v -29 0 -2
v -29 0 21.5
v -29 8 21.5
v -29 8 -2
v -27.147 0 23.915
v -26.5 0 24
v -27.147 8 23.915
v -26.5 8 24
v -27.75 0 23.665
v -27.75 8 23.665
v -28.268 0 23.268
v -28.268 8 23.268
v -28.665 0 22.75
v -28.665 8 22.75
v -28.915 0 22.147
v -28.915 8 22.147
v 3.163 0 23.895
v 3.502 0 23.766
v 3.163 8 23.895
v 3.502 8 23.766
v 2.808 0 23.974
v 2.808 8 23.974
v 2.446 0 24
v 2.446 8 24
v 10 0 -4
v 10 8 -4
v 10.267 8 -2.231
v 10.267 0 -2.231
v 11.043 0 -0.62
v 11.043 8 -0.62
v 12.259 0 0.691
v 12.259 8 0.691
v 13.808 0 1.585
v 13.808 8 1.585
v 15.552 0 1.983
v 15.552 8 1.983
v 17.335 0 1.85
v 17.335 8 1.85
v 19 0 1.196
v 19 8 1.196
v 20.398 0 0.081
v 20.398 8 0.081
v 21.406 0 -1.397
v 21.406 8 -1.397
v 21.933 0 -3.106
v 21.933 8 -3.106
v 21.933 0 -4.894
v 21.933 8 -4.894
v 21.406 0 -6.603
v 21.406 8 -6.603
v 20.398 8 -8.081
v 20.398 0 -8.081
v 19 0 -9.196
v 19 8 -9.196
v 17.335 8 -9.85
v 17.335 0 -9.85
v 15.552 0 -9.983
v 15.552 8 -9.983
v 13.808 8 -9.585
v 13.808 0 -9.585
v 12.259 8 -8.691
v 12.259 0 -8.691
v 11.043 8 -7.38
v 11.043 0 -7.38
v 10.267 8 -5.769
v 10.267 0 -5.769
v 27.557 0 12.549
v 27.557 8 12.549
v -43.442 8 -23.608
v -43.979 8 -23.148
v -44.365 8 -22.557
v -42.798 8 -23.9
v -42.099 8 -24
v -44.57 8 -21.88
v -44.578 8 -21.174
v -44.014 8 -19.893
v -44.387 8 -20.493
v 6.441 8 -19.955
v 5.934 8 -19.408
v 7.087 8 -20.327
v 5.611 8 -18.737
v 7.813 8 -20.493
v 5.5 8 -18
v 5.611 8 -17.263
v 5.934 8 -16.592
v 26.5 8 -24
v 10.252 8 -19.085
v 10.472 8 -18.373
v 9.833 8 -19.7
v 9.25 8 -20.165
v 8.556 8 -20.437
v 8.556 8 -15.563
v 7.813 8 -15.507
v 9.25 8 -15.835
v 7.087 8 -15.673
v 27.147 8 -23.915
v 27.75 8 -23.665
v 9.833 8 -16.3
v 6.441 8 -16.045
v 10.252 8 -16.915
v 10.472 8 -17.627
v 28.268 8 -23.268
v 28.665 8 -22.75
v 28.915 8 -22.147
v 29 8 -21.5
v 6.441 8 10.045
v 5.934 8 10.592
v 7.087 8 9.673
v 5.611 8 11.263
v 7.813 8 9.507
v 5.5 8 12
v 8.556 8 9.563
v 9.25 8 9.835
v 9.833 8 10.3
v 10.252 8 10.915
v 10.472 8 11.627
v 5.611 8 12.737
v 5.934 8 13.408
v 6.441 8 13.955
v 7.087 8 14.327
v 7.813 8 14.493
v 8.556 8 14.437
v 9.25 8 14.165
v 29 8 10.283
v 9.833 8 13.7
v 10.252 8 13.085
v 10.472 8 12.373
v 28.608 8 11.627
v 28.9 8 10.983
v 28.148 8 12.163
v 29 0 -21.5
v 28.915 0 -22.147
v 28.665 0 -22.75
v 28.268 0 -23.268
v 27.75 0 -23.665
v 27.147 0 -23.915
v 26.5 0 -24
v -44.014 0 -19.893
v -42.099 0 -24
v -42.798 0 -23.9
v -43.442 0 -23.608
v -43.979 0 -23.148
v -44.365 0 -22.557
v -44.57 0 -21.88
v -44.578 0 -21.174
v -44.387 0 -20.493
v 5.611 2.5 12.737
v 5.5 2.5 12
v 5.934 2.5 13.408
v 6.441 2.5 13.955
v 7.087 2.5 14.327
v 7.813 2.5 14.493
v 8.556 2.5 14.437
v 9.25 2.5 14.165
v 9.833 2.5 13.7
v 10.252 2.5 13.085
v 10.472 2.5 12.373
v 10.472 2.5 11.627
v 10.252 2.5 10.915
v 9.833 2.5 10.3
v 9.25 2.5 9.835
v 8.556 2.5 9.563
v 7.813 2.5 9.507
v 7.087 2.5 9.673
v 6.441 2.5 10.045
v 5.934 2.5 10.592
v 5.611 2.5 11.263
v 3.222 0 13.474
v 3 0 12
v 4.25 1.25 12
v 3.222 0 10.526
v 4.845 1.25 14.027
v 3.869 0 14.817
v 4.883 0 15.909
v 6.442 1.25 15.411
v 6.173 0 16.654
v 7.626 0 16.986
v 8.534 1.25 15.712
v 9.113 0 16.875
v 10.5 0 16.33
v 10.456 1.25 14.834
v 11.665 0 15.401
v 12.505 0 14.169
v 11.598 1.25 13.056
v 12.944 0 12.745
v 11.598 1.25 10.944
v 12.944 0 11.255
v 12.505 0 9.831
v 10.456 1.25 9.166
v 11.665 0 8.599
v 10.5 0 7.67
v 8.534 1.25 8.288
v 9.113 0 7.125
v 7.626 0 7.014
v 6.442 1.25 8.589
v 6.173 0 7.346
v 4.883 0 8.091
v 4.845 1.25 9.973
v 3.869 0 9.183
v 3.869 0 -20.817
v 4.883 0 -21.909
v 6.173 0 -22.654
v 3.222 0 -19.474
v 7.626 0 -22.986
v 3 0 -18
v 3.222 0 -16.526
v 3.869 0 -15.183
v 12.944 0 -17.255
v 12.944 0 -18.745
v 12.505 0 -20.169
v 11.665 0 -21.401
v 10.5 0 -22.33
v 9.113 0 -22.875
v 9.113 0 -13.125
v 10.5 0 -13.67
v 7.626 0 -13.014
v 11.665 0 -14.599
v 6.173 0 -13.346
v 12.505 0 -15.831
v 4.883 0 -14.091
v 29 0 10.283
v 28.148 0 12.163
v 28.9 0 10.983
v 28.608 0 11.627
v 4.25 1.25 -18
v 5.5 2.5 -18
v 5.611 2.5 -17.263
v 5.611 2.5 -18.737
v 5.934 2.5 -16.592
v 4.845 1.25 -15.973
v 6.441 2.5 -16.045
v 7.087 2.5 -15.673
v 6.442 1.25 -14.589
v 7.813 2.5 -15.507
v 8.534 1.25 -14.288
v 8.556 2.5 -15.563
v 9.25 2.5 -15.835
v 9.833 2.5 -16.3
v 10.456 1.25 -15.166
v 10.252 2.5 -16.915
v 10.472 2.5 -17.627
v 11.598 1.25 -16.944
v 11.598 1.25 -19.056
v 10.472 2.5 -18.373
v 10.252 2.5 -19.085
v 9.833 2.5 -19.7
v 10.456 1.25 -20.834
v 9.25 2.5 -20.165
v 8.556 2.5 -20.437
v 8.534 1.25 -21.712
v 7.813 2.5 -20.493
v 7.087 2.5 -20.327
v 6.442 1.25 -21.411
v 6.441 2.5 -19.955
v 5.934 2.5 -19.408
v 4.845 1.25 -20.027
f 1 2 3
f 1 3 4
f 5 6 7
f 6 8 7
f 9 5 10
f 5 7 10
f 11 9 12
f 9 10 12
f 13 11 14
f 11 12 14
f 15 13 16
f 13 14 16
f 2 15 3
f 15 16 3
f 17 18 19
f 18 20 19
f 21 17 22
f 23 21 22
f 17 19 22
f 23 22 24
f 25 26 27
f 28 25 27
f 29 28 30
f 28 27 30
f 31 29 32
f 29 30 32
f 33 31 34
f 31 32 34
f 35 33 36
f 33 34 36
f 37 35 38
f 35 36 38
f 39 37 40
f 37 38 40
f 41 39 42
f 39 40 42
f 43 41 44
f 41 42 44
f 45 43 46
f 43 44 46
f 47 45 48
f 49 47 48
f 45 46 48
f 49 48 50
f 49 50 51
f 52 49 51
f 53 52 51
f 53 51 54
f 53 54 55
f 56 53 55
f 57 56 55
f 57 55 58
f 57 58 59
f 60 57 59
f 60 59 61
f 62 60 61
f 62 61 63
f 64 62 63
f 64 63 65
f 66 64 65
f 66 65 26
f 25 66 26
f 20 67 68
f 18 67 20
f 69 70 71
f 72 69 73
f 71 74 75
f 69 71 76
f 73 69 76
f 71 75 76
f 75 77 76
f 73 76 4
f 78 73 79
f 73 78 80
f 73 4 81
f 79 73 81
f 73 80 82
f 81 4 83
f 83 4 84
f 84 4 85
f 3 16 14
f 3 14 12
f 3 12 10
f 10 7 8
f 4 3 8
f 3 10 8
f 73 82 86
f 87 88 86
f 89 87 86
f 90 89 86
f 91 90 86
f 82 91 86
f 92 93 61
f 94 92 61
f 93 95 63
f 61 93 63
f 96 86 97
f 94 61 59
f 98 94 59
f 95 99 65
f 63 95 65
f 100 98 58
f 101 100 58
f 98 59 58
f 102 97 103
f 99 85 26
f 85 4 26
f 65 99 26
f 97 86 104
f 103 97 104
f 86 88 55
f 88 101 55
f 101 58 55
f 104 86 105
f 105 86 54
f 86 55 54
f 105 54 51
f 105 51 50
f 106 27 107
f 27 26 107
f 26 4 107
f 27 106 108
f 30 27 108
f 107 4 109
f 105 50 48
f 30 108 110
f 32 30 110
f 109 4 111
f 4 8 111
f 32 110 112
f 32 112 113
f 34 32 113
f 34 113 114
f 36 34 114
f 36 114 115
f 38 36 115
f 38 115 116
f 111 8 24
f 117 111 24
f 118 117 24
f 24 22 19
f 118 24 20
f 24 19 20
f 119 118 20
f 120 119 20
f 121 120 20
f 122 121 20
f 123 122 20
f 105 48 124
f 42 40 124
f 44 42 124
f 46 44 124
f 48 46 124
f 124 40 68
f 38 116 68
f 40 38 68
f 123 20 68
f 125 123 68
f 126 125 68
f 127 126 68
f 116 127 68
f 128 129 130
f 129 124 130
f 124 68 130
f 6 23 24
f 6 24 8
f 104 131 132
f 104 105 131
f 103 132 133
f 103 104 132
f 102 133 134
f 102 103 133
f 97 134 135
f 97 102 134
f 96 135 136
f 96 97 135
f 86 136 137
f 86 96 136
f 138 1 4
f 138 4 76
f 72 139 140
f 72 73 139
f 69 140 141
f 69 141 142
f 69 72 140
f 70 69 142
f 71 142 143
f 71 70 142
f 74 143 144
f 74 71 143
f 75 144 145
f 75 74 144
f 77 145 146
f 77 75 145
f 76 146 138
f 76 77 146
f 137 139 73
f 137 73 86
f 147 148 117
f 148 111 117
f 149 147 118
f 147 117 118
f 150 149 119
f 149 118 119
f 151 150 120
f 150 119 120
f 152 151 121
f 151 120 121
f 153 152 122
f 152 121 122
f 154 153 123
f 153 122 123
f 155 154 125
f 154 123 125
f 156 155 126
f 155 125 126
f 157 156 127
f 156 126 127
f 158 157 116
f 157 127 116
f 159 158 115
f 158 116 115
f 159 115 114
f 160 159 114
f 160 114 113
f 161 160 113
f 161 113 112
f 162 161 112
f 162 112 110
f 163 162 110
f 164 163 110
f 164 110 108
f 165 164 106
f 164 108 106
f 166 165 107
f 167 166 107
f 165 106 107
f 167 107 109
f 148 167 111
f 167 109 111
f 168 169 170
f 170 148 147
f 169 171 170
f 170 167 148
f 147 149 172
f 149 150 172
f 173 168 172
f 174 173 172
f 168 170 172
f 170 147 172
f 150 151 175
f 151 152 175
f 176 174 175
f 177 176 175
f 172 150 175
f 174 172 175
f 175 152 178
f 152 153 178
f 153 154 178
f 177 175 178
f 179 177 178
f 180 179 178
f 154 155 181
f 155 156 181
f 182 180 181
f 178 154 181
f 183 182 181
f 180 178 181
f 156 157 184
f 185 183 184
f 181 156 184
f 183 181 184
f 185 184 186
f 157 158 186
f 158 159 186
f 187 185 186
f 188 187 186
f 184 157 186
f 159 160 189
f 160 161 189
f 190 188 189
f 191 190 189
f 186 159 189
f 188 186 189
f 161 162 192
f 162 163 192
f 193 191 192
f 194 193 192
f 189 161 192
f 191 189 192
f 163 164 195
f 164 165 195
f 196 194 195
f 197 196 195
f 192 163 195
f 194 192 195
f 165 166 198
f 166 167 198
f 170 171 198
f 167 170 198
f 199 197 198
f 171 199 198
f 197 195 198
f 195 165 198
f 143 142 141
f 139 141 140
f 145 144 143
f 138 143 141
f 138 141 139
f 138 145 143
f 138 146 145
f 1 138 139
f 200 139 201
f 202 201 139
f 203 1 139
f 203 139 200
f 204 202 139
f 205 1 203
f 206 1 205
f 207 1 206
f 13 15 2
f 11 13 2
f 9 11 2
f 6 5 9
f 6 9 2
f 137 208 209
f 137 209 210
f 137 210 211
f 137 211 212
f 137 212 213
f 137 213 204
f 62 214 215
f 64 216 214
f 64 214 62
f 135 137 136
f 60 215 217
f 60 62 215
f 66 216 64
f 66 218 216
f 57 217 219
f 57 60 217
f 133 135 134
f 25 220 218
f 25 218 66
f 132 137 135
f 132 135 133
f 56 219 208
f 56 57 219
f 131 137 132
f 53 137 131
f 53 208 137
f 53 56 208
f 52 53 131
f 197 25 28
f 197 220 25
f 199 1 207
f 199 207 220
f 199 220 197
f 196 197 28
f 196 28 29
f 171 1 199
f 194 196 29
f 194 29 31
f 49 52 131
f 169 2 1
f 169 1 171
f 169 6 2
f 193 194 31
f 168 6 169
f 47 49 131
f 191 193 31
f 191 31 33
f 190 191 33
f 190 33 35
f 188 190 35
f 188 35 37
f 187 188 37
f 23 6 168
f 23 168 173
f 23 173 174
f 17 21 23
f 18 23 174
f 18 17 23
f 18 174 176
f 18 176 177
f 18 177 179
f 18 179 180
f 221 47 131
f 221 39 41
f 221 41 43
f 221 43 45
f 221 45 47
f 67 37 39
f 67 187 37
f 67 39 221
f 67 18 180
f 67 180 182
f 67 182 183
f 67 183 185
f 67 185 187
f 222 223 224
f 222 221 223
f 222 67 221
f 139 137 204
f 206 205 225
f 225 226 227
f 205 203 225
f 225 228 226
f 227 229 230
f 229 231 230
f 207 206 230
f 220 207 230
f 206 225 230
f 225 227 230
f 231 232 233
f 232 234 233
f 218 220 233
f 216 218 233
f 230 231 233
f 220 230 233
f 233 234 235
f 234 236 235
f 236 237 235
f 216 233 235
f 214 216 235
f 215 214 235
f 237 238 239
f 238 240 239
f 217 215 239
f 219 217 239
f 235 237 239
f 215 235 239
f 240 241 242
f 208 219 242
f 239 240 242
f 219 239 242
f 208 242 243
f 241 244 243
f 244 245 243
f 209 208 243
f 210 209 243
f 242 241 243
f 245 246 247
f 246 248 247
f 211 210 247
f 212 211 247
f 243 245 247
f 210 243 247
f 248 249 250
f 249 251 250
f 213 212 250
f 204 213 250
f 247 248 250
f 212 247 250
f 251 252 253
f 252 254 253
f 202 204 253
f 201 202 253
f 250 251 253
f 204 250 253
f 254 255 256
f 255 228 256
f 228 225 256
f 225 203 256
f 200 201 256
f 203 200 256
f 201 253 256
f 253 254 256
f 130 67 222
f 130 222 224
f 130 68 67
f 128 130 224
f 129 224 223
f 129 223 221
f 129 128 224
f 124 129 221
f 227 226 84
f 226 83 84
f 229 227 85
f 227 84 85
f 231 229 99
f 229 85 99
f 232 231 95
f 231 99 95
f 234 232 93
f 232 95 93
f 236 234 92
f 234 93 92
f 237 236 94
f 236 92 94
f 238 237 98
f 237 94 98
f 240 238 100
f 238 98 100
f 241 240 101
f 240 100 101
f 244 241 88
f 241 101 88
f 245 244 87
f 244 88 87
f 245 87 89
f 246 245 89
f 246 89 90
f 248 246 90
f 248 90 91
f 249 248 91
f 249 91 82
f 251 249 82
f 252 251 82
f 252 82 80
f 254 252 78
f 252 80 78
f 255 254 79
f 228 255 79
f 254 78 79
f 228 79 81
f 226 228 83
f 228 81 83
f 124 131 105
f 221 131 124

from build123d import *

# Parameters (mm, degrees)
F1_DEPTH       = 8
F2_D           = 5
F2_CSINK_D     = 10
F2_CSINK_ANGLE = 90
F3_D           = 12
F4_R           = 2.5


with BuildPart() as f1:
    # F0 (on Front) → F1 (new body)
    with BuildSketch(Plane.XZ):
        Polygon((29, 11.876001), (3, 24), (-29, 24), (-29, -2), (-47.460192, -24), (3, -24), (29, -24), align=None)
    extrude(amount=-F1_DEPTH)

    # F2 (through all)
    with Locations(Plane.XZ):
        with Locations((8, -18), (8, 12)):
            CounterSinkHole(F2_D / 2, F2_CSINK_D / 2, counter_sink_angle=F2_CSINK_ANGLE)

    # F3 (through all)
    with Locations(Plane.XZ):
        with Locations((16, -4)):
            Hole(F3_D / 2)

    # F4
    f4_edges = [f1.edges().sort_by_distance(p)[0] for p in [
        (-47.460192, 4, -24),
        (-29, 4, 24),
        (3, 4, 24),
        (29, 4, 11.876001),
        (29, 4, -24),
    ]]
    fillet(f4_edges, radius=F4_R)


solid = f1.part
